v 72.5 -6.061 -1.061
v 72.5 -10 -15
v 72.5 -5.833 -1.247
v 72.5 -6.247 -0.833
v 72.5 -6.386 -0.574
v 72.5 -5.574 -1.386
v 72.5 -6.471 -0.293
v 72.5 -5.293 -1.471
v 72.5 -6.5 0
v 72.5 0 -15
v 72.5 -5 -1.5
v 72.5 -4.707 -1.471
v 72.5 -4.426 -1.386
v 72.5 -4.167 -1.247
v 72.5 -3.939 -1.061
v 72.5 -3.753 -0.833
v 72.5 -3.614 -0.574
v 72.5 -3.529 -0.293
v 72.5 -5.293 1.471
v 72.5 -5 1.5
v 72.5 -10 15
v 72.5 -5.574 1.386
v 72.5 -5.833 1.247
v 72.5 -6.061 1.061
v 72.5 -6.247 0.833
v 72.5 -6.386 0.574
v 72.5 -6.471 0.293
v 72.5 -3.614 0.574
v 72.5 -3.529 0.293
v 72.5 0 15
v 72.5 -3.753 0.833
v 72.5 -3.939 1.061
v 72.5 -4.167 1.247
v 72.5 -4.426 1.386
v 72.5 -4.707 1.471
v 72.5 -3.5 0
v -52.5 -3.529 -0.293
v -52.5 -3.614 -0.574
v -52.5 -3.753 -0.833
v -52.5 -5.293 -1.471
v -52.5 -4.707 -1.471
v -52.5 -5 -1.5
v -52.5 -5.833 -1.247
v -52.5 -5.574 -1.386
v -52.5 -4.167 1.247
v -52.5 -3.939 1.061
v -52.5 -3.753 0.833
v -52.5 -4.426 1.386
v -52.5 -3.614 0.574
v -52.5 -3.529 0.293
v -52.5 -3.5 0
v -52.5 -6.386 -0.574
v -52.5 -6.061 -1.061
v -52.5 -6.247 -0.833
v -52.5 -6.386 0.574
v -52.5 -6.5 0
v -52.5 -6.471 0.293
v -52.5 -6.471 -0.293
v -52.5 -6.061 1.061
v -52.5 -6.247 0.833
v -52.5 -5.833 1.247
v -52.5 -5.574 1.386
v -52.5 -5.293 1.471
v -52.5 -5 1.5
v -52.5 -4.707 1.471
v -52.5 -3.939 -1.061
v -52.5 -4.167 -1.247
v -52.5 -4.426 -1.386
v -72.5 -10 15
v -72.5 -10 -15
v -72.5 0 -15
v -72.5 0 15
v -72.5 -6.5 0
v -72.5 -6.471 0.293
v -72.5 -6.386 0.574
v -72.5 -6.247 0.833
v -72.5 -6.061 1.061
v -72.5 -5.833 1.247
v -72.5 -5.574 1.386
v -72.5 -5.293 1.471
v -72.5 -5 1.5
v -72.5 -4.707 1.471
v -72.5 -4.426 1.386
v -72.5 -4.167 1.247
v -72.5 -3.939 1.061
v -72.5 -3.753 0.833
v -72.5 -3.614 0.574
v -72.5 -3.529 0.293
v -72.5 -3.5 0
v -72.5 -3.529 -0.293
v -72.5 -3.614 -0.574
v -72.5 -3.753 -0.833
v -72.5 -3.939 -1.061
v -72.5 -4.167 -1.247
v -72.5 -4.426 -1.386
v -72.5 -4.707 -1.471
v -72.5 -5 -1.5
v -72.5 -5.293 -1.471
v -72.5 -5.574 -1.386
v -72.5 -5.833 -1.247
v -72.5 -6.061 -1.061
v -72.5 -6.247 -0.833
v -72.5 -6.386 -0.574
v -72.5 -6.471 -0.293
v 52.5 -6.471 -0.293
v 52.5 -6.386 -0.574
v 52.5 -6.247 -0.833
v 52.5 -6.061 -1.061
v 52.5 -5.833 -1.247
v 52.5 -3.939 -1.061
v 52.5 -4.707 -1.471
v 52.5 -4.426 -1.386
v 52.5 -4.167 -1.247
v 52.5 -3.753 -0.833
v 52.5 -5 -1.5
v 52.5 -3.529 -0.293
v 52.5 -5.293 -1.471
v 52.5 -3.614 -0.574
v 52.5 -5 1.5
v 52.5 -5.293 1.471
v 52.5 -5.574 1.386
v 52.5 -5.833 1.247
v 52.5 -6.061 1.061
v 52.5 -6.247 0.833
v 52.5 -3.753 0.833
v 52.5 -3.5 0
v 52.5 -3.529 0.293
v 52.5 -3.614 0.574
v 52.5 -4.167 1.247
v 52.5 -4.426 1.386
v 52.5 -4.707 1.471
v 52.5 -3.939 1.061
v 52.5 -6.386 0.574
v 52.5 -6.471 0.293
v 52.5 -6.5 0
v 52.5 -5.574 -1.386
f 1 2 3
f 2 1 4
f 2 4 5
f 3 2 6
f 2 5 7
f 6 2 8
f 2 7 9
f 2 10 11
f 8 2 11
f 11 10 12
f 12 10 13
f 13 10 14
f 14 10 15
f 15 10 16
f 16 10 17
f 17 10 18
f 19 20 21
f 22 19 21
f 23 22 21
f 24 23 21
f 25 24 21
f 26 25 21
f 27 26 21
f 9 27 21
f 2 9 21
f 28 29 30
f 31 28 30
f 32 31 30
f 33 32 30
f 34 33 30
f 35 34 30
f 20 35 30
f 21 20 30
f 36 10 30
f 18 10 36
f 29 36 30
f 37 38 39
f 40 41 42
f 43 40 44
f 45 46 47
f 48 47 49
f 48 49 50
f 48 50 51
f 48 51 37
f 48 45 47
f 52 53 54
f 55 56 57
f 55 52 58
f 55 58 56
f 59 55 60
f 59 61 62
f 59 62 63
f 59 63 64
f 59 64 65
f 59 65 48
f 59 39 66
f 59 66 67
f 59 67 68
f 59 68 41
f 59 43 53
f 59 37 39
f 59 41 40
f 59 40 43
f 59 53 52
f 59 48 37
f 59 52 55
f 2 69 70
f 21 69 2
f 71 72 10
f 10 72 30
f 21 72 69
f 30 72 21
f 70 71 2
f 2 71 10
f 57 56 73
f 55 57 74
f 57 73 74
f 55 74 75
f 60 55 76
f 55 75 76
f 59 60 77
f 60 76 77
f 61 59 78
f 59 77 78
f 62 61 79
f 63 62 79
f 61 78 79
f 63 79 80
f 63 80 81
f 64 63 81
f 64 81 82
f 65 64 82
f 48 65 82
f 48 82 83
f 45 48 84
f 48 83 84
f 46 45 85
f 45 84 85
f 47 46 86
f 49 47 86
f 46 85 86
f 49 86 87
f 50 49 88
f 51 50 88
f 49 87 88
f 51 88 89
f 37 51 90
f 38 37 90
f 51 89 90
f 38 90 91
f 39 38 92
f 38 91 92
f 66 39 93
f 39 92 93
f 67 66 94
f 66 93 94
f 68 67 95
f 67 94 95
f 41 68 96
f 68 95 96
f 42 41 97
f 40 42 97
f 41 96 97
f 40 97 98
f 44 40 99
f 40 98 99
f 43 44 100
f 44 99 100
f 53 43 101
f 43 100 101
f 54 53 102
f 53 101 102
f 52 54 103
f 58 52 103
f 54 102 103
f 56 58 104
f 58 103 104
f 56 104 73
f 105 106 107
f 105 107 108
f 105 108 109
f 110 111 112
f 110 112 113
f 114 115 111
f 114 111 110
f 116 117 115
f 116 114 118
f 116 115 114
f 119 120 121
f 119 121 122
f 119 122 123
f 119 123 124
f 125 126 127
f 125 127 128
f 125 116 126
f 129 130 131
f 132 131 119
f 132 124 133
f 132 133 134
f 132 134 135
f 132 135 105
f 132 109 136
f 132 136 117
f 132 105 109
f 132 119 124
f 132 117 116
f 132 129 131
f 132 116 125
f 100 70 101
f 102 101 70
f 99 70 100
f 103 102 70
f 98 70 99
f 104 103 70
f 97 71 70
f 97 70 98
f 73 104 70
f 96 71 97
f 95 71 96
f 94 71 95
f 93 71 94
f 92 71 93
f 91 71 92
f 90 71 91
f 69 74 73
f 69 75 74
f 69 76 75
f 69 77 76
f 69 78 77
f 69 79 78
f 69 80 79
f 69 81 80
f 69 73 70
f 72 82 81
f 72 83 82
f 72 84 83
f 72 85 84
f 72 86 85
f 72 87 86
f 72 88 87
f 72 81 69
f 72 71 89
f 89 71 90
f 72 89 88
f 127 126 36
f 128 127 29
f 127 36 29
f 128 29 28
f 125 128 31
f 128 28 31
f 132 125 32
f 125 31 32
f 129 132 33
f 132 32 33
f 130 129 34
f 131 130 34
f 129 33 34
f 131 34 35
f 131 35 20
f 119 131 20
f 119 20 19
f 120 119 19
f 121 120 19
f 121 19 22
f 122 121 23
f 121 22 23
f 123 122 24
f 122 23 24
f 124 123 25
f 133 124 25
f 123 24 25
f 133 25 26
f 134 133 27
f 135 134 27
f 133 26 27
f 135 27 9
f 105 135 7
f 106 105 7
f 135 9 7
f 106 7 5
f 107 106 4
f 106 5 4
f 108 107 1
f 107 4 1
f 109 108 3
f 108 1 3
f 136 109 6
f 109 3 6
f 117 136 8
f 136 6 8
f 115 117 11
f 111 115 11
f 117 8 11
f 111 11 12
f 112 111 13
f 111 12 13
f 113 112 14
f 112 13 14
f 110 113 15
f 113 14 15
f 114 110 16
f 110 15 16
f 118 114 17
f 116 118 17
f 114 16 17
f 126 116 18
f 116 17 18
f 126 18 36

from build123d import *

# Parameters (mm, degrees)
F0_W     = 145
F0_H     = 30
F1_DEPTH = 10
F2_R     = 1.5
F3_DEPTH = 20
F4_R     = 1.5
F5_DEPTH = 20


with BuildPart() as f1:
    # F0 (on Front) → F1 (new body)
    with BuildSketch(Plane.XZ):
        Rectangle(F0_W, F0_H)
    extrude(amount=F1_DEPTH)

    # F2 (on face) → F3 (cut)
    with BuildSketch(Plane(origin=(-72.5, 0, 0), x_dir=(0, -1, 0), z_dir=(-1, 0, 0))):
        with Locations((5, 0)):
            Circle(F2_R)
    extrude(amount=-F3_DEPTH, mode=Mode.SUBTRACT)

    # F4 (on face) → F5 (cut)
    with BuildSketch(Plane.YZ.offset(72.5)):
        with Locations((-5, 0)):
            Circle(F4_R)
    extrude(amount=-F5_DEPTH, mode=Mode.SUBTRACT)


solid = f1.part
